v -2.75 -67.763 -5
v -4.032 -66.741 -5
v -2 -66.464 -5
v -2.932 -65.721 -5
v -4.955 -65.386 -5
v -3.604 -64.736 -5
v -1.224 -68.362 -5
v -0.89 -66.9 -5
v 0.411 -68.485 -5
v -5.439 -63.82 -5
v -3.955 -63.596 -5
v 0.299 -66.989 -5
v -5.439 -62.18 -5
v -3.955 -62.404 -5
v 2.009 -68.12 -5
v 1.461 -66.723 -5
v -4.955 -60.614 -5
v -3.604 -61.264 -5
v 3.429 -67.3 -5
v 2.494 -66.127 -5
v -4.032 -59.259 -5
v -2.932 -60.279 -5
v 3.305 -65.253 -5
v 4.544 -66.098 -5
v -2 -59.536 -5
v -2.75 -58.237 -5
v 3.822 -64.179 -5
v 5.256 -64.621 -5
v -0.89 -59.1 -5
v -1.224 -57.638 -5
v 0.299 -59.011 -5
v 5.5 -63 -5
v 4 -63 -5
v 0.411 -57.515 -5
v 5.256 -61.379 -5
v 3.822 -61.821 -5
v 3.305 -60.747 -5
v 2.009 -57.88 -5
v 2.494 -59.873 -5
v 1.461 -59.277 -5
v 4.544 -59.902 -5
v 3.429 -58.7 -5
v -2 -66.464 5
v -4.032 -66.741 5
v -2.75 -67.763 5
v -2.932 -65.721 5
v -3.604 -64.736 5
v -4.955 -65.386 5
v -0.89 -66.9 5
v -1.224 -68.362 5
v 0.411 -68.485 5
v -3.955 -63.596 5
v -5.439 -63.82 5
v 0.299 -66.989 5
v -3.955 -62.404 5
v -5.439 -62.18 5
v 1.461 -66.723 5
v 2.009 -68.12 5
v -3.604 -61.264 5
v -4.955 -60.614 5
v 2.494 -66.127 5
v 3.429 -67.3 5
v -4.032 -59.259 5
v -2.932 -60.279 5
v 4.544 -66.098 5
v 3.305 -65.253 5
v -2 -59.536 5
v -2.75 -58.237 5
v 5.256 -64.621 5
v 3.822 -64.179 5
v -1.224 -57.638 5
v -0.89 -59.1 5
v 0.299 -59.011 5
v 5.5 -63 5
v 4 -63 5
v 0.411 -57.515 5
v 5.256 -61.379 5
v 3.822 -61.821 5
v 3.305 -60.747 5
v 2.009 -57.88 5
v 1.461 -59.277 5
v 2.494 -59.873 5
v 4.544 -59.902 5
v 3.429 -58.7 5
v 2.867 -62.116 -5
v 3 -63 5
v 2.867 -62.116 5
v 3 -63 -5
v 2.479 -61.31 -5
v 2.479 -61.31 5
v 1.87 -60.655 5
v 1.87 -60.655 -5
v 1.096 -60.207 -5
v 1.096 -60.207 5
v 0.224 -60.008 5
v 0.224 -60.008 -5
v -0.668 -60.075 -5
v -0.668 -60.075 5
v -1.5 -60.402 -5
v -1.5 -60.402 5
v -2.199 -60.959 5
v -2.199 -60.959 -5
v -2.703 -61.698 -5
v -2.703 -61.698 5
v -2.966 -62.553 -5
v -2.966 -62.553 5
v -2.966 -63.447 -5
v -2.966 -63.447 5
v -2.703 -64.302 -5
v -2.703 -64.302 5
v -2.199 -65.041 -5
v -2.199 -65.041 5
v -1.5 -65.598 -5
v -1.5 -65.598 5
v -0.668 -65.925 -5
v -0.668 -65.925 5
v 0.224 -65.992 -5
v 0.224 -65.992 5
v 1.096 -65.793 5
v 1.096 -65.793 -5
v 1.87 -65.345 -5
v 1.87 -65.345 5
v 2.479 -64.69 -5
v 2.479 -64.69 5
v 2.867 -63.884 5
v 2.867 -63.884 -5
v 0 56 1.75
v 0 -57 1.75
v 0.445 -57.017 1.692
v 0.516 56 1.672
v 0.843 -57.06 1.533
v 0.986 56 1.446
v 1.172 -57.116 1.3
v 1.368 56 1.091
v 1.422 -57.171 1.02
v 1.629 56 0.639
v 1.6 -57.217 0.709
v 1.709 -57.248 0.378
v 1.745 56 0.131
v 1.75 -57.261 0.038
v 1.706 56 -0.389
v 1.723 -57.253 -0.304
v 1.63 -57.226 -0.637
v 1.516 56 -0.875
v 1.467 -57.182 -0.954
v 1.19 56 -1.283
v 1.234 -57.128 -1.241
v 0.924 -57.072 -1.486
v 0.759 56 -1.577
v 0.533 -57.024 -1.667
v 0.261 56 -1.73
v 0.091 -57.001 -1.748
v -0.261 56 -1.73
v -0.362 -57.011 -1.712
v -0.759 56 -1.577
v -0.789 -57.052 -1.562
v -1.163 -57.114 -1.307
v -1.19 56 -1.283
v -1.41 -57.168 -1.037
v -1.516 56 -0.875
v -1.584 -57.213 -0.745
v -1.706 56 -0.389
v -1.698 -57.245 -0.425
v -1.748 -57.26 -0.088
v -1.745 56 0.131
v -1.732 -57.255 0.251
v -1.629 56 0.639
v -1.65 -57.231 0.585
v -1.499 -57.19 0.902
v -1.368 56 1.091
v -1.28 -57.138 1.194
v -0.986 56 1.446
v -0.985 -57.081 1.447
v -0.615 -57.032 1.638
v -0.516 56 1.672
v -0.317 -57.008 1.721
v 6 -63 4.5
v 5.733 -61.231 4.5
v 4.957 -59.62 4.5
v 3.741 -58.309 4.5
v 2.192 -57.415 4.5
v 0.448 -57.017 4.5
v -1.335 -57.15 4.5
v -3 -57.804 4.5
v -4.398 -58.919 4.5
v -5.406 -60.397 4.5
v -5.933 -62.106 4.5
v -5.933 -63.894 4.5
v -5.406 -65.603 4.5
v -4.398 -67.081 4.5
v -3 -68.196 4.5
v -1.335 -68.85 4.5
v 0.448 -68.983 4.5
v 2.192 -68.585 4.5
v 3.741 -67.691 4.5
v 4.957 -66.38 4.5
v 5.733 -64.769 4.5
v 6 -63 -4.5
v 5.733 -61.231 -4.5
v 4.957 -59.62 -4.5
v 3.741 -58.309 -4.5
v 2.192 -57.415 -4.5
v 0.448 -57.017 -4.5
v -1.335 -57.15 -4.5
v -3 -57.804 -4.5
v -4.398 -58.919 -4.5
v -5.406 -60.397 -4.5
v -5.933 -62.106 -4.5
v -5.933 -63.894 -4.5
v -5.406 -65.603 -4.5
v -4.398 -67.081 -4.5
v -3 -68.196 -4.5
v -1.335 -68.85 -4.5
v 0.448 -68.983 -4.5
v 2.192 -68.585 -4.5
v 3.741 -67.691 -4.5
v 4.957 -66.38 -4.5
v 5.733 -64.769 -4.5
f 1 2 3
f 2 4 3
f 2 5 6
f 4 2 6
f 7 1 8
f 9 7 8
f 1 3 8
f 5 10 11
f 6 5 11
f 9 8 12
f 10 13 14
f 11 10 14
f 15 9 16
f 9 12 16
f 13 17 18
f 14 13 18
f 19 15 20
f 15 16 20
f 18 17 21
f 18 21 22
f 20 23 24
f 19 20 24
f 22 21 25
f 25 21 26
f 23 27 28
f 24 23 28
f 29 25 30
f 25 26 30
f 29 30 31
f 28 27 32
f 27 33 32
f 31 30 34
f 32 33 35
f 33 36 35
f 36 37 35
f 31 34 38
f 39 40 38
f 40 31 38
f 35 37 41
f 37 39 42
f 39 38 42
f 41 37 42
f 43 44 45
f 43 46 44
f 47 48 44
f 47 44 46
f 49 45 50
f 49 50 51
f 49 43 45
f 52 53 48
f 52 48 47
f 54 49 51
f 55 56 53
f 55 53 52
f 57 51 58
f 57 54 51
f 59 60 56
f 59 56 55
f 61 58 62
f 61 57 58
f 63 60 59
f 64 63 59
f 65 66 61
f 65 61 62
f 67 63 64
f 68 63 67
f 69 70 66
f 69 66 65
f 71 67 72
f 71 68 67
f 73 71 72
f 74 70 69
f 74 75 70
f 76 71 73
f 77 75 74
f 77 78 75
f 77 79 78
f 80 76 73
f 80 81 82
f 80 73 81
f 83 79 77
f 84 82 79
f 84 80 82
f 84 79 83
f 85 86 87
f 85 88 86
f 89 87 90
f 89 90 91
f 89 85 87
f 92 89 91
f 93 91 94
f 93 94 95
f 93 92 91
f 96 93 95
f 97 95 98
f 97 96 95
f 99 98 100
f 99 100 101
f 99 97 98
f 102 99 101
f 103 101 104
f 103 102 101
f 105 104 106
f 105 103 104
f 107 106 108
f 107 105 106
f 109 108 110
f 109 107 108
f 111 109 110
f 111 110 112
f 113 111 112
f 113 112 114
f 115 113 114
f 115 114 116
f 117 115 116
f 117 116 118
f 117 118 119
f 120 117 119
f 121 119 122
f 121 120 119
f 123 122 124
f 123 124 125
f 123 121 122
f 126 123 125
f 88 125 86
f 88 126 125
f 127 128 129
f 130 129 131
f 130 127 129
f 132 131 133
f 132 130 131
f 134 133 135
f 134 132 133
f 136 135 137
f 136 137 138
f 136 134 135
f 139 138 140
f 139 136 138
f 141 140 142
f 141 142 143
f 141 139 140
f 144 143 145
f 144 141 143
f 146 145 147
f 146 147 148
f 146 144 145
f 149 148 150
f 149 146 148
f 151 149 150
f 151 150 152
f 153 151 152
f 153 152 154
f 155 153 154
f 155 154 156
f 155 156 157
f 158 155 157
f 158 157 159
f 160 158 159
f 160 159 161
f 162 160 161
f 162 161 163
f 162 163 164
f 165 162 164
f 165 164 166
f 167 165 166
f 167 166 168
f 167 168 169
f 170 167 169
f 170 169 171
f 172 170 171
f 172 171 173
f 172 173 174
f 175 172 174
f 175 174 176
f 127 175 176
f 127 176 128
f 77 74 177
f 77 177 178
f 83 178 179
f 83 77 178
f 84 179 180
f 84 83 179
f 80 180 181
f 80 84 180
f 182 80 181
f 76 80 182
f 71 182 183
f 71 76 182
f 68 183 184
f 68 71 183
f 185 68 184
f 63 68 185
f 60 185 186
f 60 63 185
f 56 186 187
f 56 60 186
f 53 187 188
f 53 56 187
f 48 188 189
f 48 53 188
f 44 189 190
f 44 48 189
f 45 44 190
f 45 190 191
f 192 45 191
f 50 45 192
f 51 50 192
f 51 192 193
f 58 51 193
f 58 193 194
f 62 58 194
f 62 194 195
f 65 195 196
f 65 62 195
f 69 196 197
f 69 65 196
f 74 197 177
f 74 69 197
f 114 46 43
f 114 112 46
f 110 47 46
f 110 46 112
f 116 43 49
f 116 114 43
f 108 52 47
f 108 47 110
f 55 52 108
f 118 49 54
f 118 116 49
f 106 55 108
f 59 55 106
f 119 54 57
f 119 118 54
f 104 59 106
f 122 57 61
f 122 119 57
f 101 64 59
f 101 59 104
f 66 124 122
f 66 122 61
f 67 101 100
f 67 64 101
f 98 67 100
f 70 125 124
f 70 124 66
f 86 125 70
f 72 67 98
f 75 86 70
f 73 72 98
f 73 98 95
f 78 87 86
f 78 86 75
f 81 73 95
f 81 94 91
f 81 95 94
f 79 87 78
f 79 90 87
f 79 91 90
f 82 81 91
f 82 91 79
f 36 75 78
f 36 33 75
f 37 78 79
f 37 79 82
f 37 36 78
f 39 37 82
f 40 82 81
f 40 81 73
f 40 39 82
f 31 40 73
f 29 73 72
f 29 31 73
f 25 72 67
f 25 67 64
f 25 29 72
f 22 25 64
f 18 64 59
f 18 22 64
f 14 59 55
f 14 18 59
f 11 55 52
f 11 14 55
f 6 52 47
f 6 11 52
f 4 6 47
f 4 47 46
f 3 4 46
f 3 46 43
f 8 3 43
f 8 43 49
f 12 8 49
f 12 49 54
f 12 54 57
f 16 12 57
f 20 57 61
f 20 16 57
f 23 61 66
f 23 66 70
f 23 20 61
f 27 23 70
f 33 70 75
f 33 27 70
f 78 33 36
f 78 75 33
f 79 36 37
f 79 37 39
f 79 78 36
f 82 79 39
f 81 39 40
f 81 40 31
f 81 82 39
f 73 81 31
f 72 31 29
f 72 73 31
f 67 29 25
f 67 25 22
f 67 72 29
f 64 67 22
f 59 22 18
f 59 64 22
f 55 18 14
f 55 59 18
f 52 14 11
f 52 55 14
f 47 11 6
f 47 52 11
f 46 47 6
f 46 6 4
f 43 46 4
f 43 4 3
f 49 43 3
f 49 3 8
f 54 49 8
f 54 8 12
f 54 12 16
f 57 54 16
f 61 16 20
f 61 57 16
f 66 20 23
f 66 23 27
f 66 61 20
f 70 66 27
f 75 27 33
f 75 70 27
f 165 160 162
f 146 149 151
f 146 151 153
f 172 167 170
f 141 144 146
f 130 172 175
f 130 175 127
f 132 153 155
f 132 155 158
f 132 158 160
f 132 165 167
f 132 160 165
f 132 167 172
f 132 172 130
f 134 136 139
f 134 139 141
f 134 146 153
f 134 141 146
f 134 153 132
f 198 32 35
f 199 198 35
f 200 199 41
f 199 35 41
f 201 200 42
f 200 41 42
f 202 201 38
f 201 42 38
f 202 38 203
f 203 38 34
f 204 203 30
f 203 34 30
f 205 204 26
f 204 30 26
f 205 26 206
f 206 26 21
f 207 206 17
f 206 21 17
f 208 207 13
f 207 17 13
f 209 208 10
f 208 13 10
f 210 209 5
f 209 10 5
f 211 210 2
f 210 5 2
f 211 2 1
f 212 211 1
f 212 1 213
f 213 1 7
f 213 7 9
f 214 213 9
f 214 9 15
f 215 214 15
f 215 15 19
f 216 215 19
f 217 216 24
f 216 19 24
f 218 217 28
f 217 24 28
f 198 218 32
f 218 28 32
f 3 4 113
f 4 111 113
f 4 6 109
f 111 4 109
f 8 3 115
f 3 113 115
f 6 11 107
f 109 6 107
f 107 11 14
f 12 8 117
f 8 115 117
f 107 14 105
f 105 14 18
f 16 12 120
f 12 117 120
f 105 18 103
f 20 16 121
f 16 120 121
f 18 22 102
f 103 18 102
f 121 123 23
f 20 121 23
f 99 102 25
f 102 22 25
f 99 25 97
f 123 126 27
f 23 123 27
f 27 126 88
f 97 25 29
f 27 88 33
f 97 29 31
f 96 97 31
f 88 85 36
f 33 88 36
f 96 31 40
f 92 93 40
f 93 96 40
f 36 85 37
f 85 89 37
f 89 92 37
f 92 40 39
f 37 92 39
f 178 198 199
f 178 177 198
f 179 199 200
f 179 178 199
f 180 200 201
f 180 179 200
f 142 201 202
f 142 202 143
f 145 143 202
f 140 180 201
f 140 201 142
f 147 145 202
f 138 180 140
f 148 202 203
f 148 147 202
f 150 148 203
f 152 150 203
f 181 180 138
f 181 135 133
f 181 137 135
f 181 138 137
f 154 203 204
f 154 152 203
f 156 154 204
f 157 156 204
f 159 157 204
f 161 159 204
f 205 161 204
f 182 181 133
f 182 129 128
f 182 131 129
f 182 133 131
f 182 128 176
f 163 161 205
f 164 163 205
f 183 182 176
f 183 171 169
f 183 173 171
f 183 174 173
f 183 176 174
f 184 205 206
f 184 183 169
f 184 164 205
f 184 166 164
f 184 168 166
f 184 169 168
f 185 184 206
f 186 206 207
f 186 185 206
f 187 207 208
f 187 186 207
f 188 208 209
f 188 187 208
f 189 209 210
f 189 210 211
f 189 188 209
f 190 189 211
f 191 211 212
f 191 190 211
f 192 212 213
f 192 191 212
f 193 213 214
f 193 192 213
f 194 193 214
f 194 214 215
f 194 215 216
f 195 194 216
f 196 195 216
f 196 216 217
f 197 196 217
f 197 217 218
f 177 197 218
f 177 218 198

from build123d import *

# Parameters (mm, degrees)
BOSS_EXTRUDE1_DEPTH      = 56
BOSS_EXTRUDE1_DEPTH_BACK = 58
SKETCH1_R                = 3
SKETCH2_R                = 6
SKETCH2_R_2              = 4
BOSS_EXTRUDE2_DEPTH      = 5
SKETCH3_R                = 4
SKETCH3_R_2              = 3
BOSS_EXTRUDE3_DEPTH      = 5
CHAMFER2_SIZE            = 0.5
SKETCH4_OUTSIDE_W        = 39.194
SKETCH4_OUTSIDE_H        = 37.194
SKETCH4_OUTSIDE_R        = 1.75
CUT_EXTRUDE4_DEPTH       = 114


with BuildPart() as part:
    # Sketch1 → Boss-Extrude1 (new, two sides: drawn at the far end of the back side and taken through both)
    with BuildSketch(Plane(origin=(0, 0, 0), x_dir=(1, 0, 0), z_dir=(0, 1, 0)).offset(-BOSS_EXTRUDE1_DEPTH_BACK)):
        with Locations(Location((0, 0, 0), (0, 0, 270))):
            Circle(SKETCH1_R)
    extrude(amount=BOSS_EXTRUDE1_DEPTH + BOSS_EXTRUDE1_DEPTH_BACK)

    # Sketch4 outside → Cut-Extrude4 (cut)
    with BuildSketch(Plane(origin=(0, 56, 0), x_dir=(1, 0, 0), z_dir=(0, 1, 0))):
        Rectangle(SKETCH4_OUTSIDE_W, SKETCH4_OUTSIDE_H)
        with Locations(Location((0, 0, 0), (0, 0, 270))):
            Circle(SKETCH4_OUTSIDE_R, mode=Mode.SUBTRACT)
    extrude(amount=-CUT_EXTRUDE4_DEPTH, mode=Mode.SUBTRACT)


with BuildPart() as body_2:
    # Sketch2 → Boss-Extrude2 (new, symmetric)
    with BuildSketch(Plane.XY):
        with Locations((0, -63)):
            Circle(SKETCH2_R)
        with Locations((0, -63)):
            Circle(SKETCH2_R_2, mode=Mode.SUBTRACT)
    extrude(amount=BOSS_EXTRUDE2_DEPTH, both=True)

    # Chamfer2
    chamfer2_edges = [body_2.edges().sort_by_distance(p)[0] for p in [
        (-6, -63, -5),
        (-6, -63, 5),
    ]]
    chamfer(chamfer2_edges, length=CHAMFER2_SIZE)


with BuildPart() as body_3:
    # Sketch3 → Boss-Extrude3 (new, symmetric)
    with BuildSketch(Plane.XY):
        with Locations((0, -63)):
            Circle(SKETCH3_R)
        with Locations((0, -63)):
            Circle(SKETCH3_R_2, mode=Mode.SUBTRACT)
    extrude(amount=BOSS_EXTRUDE3_DEPTH, both=True)


with BuildPart() as part_1:
    add(part.part)

    # Combine1: union body 2
    add(body_2.part)


solid = Compound([body_3.part, part_1.part])
